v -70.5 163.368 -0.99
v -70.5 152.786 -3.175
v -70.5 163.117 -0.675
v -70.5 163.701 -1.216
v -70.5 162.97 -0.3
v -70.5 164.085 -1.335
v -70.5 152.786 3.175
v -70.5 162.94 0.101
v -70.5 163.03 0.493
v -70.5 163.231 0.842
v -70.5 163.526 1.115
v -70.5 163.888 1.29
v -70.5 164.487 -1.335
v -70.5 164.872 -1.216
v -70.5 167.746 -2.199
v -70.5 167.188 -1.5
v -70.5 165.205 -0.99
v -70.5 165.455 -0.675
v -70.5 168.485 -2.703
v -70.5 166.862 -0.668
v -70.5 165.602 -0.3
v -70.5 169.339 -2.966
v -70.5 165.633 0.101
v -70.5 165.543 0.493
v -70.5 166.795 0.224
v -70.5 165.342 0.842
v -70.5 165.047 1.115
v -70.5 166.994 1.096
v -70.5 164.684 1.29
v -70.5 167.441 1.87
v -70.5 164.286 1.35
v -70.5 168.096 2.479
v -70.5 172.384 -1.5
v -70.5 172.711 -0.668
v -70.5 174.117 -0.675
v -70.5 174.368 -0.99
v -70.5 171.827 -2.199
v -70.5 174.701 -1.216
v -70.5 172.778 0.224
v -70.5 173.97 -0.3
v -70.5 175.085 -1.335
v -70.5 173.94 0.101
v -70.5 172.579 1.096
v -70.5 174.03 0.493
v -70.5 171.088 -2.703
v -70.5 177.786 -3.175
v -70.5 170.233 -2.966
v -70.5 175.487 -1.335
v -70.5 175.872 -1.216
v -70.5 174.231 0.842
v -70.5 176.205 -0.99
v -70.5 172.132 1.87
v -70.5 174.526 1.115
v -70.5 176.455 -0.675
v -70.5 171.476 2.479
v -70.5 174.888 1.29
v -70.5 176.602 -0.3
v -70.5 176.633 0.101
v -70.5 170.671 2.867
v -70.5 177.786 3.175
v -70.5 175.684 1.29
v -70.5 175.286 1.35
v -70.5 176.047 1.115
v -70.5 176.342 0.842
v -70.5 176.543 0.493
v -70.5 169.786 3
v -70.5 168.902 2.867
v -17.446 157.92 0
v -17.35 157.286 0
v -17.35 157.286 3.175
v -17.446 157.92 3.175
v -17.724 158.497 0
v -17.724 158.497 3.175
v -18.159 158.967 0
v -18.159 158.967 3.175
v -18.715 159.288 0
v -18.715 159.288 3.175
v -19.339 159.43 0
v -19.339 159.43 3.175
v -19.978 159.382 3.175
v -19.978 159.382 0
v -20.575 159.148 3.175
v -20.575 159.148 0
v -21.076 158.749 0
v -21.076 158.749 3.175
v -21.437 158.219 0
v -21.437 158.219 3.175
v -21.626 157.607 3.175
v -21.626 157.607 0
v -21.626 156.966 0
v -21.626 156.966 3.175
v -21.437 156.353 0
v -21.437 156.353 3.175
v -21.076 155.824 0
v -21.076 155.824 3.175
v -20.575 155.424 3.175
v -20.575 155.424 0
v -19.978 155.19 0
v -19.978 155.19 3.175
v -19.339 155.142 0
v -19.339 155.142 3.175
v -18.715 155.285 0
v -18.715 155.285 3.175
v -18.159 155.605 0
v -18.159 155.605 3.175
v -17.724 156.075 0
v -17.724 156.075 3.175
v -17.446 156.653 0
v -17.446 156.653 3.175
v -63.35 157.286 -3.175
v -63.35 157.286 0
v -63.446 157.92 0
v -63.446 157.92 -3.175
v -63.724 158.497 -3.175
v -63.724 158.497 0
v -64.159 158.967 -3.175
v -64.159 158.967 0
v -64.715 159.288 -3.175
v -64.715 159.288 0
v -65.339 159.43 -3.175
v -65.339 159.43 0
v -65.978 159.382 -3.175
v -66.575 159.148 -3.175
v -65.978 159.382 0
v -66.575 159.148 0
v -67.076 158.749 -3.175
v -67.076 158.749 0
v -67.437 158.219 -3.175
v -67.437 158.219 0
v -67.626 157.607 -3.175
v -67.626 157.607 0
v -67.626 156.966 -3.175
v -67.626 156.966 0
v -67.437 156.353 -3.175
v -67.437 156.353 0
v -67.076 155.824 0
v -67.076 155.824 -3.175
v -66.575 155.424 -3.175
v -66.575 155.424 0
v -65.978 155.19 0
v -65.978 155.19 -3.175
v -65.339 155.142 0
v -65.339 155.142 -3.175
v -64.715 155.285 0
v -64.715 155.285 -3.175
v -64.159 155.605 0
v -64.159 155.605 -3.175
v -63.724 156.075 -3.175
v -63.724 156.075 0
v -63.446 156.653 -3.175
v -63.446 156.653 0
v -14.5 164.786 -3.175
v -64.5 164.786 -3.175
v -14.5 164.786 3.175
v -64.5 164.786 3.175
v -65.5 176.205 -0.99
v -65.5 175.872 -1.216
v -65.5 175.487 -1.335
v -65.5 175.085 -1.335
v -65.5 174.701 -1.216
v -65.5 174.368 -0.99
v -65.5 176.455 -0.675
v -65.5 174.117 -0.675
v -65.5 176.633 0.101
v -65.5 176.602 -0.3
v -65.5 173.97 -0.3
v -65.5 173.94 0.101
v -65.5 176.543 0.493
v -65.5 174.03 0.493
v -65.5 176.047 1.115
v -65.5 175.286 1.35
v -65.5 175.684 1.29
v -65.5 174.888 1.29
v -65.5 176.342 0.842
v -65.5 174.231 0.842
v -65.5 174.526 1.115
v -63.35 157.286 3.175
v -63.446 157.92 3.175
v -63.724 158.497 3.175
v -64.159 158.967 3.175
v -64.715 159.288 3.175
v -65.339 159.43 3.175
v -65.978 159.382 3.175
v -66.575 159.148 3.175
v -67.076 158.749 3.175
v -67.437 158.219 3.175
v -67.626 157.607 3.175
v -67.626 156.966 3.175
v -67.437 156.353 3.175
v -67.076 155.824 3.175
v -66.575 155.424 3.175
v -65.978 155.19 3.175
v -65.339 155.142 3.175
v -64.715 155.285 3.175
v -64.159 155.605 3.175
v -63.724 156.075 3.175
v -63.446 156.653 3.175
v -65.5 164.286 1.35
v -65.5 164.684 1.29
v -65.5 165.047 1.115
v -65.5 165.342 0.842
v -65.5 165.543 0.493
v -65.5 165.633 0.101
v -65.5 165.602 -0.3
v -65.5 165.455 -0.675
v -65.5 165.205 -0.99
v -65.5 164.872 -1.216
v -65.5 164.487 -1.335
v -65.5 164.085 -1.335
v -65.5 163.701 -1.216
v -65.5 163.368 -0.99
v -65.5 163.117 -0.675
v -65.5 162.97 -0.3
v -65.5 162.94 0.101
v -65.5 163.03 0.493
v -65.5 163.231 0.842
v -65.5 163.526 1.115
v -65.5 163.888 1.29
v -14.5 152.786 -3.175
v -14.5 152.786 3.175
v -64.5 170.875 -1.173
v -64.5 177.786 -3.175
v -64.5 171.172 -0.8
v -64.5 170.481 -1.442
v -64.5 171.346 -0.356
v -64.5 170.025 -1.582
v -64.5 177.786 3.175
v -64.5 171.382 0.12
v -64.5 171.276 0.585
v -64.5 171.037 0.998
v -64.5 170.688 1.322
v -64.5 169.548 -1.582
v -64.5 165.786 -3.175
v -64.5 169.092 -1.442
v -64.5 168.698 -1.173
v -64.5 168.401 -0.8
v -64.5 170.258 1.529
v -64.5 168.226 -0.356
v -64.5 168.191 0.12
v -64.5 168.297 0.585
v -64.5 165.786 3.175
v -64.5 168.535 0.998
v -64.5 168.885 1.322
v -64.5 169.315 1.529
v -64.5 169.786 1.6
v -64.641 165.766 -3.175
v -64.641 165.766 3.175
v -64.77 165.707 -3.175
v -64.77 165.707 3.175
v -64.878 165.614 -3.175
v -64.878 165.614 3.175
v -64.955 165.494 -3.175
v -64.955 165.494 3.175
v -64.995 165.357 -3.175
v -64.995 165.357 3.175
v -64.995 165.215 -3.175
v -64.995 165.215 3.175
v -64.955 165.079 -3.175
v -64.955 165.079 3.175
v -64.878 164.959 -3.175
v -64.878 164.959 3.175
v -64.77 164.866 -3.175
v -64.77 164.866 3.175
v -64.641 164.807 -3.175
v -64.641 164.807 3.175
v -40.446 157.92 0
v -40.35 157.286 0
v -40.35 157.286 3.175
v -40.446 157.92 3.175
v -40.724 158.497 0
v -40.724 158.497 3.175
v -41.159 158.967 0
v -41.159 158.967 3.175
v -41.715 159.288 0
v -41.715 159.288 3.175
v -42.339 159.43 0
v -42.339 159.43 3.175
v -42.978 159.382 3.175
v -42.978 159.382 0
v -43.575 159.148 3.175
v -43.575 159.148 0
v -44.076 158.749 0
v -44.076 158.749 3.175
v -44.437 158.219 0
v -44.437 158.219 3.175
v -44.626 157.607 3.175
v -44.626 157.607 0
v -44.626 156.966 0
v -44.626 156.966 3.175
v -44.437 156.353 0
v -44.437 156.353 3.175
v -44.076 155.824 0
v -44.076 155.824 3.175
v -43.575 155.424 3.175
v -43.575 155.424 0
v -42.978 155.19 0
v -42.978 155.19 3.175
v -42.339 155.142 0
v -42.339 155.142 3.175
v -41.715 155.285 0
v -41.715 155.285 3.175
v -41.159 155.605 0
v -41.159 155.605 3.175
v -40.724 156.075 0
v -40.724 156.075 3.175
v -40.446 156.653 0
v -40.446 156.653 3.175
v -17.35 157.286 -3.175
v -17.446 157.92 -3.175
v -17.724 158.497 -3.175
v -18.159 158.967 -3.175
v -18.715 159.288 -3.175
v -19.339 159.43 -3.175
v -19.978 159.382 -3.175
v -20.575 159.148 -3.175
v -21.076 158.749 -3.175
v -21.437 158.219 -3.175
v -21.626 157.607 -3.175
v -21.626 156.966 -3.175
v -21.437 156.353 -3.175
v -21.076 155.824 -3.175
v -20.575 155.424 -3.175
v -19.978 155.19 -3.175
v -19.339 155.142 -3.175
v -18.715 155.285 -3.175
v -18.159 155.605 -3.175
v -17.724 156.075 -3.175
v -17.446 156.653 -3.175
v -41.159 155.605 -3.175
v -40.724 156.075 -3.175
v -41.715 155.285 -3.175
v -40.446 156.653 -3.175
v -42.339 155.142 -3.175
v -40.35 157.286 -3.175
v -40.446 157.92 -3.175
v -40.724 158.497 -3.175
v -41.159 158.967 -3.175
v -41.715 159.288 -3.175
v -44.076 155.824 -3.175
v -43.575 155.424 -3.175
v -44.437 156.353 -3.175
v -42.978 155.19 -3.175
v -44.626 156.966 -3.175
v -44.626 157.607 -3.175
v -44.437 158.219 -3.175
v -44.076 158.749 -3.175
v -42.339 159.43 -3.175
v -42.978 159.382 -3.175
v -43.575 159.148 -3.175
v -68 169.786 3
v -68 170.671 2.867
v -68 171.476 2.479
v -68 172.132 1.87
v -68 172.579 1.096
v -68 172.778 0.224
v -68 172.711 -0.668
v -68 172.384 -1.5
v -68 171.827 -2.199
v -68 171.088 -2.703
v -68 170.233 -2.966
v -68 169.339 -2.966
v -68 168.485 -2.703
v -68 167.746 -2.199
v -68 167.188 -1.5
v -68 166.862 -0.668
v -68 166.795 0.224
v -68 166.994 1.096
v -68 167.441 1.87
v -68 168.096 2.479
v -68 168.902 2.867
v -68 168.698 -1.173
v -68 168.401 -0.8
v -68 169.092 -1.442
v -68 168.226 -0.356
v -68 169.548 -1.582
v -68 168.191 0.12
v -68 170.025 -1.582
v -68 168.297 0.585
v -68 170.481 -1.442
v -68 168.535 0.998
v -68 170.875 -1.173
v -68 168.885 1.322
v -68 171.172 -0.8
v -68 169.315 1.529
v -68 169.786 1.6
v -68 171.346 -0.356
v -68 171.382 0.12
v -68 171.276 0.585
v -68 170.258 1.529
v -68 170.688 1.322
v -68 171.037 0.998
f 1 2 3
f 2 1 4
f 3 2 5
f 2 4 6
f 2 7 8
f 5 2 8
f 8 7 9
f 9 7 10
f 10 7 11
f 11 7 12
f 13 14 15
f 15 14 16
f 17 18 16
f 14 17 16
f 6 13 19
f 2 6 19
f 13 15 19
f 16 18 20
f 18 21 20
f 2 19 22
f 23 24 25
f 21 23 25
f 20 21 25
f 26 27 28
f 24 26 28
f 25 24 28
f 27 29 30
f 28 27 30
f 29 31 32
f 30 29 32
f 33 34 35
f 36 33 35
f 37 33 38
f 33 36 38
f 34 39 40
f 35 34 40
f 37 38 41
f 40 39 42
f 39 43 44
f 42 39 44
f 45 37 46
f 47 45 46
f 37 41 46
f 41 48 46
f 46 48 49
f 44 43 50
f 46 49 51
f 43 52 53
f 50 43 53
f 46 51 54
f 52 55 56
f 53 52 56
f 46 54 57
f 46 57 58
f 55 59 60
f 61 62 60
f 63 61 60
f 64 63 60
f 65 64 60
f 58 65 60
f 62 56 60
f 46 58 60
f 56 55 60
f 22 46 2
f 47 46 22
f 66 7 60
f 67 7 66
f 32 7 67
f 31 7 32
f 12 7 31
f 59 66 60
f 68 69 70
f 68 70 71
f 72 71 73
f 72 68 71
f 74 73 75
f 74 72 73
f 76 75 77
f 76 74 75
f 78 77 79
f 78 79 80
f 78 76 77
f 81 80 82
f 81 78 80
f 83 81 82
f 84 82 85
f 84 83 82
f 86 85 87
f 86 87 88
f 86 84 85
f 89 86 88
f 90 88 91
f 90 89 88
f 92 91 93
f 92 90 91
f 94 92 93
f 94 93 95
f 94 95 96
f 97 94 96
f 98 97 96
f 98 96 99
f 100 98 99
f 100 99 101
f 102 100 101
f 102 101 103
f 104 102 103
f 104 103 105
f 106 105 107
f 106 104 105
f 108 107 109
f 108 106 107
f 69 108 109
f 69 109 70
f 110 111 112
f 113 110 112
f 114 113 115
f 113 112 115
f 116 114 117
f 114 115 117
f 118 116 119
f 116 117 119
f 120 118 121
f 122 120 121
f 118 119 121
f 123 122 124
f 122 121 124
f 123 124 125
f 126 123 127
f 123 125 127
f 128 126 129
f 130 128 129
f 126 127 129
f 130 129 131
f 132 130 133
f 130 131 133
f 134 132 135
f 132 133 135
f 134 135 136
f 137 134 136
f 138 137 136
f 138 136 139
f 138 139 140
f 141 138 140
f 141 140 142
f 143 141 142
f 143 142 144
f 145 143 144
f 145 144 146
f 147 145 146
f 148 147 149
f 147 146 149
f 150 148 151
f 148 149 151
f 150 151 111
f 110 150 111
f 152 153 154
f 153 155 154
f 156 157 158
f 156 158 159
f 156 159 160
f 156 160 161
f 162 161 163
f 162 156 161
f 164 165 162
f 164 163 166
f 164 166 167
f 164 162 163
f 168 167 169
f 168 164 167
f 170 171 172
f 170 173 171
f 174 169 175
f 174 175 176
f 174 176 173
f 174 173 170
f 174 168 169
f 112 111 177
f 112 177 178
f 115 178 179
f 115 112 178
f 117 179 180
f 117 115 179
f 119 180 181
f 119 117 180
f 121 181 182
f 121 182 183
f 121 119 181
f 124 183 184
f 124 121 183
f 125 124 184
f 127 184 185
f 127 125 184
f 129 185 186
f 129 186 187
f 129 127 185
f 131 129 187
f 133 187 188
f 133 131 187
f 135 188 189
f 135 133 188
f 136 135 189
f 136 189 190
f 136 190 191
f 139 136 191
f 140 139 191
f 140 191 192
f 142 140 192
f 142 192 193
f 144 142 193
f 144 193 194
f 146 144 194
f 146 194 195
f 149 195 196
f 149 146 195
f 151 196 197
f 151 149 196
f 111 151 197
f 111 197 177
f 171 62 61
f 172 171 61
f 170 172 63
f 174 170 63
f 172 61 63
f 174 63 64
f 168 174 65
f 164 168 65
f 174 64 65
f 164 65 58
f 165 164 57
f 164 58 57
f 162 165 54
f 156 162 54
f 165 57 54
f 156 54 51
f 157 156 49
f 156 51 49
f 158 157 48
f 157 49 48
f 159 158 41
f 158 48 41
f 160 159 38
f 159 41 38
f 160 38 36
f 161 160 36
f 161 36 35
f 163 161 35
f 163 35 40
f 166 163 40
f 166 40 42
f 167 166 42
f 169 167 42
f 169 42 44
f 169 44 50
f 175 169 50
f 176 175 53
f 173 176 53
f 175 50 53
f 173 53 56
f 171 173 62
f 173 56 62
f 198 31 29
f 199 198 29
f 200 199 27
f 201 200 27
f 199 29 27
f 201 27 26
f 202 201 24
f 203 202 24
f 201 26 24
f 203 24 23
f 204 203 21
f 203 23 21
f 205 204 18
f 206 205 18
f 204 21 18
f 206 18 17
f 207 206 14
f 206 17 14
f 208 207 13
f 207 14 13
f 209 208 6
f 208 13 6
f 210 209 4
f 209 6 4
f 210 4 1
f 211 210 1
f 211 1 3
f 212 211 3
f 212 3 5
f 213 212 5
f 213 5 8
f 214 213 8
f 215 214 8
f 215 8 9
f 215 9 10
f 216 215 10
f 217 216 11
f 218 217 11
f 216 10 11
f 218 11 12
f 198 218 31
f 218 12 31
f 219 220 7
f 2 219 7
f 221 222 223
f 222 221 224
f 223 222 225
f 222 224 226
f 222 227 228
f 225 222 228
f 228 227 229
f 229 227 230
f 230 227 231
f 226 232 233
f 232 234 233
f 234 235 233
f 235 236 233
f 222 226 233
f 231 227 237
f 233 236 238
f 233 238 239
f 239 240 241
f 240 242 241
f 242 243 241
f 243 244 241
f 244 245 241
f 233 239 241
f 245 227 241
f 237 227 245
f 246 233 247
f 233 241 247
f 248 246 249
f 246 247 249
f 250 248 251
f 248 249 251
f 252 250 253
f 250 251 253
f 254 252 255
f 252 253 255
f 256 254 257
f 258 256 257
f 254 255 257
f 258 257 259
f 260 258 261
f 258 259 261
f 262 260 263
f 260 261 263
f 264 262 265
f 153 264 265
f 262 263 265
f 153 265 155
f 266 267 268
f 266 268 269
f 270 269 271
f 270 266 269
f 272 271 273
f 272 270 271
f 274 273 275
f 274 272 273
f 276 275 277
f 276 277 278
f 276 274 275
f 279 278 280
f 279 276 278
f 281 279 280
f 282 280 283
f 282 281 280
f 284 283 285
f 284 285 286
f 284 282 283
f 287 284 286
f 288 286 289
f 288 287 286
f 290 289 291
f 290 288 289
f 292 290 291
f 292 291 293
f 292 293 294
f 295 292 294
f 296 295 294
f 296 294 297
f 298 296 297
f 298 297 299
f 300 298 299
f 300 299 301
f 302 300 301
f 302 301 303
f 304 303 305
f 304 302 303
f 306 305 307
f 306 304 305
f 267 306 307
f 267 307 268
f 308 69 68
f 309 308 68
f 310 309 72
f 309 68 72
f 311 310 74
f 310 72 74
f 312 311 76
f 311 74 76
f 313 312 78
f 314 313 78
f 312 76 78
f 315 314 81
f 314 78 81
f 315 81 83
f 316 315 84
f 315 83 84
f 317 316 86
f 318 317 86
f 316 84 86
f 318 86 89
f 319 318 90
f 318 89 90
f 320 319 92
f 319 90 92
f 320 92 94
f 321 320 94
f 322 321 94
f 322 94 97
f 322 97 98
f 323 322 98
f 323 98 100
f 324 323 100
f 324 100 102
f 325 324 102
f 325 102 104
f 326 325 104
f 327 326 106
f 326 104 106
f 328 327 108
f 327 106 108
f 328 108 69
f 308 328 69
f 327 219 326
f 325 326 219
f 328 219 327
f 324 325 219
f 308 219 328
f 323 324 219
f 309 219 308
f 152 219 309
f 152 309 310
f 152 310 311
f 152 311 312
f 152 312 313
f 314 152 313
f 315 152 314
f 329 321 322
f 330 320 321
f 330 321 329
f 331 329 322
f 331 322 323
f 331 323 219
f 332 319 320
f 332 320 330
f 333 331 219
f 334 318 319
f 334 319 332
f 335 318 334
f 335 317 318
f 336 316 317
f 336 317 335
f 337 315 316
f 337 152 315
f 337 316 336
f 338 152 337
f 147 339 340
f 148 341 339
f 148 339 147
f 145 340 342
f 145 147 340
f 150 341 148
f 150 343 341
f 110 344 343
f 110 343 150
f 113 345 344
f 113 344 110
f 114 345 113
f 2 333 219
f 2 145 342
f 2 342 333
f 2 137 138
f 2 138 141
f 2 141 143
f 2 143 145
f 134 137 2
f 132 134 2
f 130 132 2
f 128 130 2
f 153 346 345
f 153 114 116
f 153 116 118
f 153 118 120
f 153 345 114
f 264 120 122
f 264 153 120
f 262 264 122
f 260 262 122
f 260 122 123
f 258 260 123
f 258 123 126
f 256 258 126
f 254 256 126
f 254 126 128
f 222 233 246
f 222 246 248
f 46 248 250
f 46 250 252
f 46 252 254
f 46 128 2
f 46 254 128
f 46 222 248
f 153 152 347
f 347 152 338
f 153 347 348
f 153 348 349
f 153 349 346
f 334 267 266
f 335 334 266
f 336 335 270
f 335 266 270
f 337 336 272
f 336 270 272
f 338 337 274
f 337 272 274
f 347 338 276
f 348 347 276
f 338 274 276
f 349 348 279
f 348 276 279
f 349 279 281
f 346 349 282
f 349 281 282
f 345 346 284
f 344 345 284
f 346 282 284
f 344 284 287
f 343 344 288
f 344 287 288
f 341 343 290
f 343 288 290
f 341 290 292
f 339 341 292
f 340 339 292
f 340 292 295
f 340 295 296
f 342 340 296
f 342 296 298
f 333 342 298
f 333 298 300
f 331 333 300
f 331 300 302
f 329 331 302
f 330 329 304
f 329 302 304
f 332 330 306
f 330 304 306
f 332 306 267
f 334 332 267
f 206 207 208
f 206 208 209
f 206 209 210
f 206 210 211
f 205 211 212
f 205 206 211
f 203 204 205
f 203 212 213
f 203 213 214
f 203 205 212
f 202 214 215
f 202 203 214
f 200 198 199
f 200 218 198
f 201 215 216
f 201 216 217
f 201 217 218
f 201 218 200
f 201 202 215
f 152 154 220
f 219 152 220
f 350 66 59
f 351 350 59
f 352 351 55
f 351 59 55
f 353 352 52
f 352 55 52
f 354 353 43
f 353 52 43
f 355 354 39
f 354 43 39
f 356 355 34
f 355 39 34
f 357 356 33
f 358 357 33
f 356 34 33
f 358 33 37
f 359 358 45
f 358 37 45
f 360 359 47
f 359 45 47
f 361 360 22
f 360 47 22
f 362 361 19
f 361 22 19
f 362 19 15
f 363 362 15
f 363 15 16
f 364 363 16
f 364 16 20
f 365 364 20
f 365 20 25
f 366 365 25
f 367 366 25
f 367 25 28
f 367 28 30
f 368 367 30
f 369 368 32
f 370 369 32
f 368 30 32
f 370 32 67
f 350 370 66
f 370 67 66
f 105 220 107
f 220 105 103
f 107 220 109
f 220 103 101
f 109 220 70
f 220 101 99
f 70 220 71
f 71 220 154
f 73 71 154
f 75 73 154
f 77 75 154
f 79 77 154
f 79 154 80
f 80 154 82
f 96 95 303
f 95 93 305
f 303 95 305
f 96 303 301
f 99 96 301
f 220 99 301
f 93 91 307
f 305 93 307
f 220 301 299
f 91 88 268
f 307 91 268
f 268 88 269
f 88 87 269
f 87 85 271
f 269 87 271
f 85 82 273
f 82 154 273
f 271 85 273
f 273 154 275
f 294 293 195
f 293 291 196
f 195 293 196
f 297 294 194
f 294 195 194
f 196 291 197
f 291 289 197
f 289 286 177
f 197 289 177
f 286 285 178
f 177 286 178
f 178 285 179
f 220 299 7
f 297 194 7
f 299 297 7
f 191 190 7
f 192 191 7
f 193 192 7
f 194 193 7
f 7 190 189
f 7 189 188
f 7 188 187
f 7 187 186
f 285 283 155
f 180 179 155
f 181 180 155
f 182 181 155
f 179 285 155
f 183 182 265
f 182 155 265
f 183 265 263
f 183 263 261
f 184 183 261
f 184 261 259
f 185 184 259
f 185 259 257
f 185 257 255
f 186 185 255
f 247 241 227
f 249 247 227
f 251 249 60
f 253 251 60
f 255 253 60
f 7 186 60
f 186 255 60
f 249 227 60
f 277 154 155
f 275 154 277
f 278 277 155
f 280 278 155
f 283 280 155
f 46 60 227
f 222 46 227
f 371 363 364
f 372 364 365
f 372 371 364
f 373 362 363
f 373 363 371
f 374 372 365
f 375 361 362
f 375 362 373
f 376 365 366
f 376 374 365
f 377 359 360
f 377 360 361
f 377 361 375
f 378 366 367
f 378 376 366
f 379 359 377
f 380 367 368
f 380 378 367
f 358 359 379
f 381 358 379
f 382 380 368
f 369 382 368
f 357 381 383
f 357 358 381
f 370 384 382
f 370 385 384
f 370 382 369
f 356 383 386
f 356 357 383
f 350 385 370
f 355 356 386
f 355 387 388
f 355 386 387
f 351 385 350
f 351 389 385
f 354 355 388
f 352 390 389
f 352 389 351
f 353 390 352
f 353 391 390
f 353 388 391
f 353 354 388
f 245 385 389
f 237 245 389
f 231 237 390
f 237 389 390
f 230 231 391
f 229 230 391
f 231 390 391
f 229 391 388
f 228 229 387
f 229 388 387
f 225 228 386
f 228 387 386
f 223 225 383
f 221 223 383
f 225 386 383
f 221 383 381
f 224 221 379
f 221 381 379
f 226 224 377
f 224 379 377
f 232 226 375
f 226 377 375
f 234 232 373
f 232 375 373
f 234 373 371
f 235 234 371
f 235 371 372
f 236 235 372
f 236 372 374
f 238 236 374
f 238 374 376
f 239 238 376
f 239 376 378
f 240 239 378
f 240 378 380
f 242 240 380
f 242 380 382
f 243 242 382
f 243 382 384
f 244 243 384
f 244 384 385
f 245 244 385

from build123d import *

# Parameters (mm, degrees)
SKETCH1_R                = 2.15
BOSS_EXTRUDE1_DEPTH      = 3.175
BOSS_EXTRUDE1_DEPTH_BACK = 3.175
CUT_EXTRUDE1_REACH       = 58
SKETCH2_R                = 1.6
SKETCH3_R                = 3
CUT_EXTRUDE2_DEPTH       = 2.5
SKETCH4_R                = 1.35
CUT_EXTRUDE3_DEPTH       = 5


with BuildPart() as part:
    # Sketch1 → Boss-Extrude1 (new body, two sides)
    with BuildSketch(Plane.XY) as boss_extrude1_sk:
        with BuildLine():
            Line((-70.5, 177.786291501), (-64.5, 177.786291501))
            Line((-64.5, 177.786291501), (-64.5, 165.786291501))
            ThreePointArc((-64.5, 165.786291501), (-65, 165.286291501), (-64.5, 164.786291501))
            Line((-64.5, 164.786291501), (-59.5, 164.786291501))
            Line((-59.5, 164.786291501), (-14.5, 164.786291501))
            Line((-14.5, 164.786291501), (-14.5, 152.786291501))
            Line((-14.5, 152.786291501), (-70.5, 152.786291501))
            Line((-70.5, 152.786291501), (-70.5, 177.786291501))
        make_face()
        with Locations((-65.5, 157.286291501)):
            Circle(SKETCH1_R, mode=Mode.SUBTRACT)
        with Locations((-42.5, 157.286291501)):
            Circle(SKETCH1_R, mode=Mode.SUBTRACT)
        with Locations((-19.5, 157.286291501)):
            Circle(SKETCH1_R, mode=Mode.SUBTRACT)
    extrude(amount=BOSS_EXTRUDE1_DEPTH)
    extrude(boss_extrude1_sk.sketch, amount=-BOSS_EXTRUDE1_DEPTH_BACK)

    # Sketch2 → Cut-Extrude1 (cut, up to next)
    with BuildSketch(Plane.ZY.offset(70.5), mode=Mode.PRIVATE) as cut_extrude1_sk1:
        with Locations((0, 169.786291501)):
            Circle(SKETCH2_R)
    cut_extrude1_tool1 = extrude(cut_extrude1_sk1.sketch, amount=-CUT_EXTRUDE1_REACH, mode=Mode.PRIVATE) & part.part
    add(cut_extrude1_tool1.solids().sort_by_distance((-70.5, 169.786292, 0))[0], mode=Mode.SUBTRACT)

    # Sketch3 → Cut-Extrude2 (cut)
    with BuildSketch(Plane.ZY.offset(70.5)):
        with Locations((0, 169.786291501)):
            Circle(SKETCH3_R)
    extrude(amount=-CUT_EXTRUDE2_DEPTH, mode=Mode.SUBTRACT)

    # Sketch4 → Cut-Extrude3 (cut)
    with BuildSketch(Plane.ZY.offset(70.5)):
        with Locations((0, 175.286291501)):
            Circle(SKETCH4_R)
        with Locations((0, 164.286291501)):
            Circle(SKETCH4_R)
    extrude(amount=-CUT_EXTRUDE3_DEPTH, mode=Mode.SUBTRACT)


solid = part.part
